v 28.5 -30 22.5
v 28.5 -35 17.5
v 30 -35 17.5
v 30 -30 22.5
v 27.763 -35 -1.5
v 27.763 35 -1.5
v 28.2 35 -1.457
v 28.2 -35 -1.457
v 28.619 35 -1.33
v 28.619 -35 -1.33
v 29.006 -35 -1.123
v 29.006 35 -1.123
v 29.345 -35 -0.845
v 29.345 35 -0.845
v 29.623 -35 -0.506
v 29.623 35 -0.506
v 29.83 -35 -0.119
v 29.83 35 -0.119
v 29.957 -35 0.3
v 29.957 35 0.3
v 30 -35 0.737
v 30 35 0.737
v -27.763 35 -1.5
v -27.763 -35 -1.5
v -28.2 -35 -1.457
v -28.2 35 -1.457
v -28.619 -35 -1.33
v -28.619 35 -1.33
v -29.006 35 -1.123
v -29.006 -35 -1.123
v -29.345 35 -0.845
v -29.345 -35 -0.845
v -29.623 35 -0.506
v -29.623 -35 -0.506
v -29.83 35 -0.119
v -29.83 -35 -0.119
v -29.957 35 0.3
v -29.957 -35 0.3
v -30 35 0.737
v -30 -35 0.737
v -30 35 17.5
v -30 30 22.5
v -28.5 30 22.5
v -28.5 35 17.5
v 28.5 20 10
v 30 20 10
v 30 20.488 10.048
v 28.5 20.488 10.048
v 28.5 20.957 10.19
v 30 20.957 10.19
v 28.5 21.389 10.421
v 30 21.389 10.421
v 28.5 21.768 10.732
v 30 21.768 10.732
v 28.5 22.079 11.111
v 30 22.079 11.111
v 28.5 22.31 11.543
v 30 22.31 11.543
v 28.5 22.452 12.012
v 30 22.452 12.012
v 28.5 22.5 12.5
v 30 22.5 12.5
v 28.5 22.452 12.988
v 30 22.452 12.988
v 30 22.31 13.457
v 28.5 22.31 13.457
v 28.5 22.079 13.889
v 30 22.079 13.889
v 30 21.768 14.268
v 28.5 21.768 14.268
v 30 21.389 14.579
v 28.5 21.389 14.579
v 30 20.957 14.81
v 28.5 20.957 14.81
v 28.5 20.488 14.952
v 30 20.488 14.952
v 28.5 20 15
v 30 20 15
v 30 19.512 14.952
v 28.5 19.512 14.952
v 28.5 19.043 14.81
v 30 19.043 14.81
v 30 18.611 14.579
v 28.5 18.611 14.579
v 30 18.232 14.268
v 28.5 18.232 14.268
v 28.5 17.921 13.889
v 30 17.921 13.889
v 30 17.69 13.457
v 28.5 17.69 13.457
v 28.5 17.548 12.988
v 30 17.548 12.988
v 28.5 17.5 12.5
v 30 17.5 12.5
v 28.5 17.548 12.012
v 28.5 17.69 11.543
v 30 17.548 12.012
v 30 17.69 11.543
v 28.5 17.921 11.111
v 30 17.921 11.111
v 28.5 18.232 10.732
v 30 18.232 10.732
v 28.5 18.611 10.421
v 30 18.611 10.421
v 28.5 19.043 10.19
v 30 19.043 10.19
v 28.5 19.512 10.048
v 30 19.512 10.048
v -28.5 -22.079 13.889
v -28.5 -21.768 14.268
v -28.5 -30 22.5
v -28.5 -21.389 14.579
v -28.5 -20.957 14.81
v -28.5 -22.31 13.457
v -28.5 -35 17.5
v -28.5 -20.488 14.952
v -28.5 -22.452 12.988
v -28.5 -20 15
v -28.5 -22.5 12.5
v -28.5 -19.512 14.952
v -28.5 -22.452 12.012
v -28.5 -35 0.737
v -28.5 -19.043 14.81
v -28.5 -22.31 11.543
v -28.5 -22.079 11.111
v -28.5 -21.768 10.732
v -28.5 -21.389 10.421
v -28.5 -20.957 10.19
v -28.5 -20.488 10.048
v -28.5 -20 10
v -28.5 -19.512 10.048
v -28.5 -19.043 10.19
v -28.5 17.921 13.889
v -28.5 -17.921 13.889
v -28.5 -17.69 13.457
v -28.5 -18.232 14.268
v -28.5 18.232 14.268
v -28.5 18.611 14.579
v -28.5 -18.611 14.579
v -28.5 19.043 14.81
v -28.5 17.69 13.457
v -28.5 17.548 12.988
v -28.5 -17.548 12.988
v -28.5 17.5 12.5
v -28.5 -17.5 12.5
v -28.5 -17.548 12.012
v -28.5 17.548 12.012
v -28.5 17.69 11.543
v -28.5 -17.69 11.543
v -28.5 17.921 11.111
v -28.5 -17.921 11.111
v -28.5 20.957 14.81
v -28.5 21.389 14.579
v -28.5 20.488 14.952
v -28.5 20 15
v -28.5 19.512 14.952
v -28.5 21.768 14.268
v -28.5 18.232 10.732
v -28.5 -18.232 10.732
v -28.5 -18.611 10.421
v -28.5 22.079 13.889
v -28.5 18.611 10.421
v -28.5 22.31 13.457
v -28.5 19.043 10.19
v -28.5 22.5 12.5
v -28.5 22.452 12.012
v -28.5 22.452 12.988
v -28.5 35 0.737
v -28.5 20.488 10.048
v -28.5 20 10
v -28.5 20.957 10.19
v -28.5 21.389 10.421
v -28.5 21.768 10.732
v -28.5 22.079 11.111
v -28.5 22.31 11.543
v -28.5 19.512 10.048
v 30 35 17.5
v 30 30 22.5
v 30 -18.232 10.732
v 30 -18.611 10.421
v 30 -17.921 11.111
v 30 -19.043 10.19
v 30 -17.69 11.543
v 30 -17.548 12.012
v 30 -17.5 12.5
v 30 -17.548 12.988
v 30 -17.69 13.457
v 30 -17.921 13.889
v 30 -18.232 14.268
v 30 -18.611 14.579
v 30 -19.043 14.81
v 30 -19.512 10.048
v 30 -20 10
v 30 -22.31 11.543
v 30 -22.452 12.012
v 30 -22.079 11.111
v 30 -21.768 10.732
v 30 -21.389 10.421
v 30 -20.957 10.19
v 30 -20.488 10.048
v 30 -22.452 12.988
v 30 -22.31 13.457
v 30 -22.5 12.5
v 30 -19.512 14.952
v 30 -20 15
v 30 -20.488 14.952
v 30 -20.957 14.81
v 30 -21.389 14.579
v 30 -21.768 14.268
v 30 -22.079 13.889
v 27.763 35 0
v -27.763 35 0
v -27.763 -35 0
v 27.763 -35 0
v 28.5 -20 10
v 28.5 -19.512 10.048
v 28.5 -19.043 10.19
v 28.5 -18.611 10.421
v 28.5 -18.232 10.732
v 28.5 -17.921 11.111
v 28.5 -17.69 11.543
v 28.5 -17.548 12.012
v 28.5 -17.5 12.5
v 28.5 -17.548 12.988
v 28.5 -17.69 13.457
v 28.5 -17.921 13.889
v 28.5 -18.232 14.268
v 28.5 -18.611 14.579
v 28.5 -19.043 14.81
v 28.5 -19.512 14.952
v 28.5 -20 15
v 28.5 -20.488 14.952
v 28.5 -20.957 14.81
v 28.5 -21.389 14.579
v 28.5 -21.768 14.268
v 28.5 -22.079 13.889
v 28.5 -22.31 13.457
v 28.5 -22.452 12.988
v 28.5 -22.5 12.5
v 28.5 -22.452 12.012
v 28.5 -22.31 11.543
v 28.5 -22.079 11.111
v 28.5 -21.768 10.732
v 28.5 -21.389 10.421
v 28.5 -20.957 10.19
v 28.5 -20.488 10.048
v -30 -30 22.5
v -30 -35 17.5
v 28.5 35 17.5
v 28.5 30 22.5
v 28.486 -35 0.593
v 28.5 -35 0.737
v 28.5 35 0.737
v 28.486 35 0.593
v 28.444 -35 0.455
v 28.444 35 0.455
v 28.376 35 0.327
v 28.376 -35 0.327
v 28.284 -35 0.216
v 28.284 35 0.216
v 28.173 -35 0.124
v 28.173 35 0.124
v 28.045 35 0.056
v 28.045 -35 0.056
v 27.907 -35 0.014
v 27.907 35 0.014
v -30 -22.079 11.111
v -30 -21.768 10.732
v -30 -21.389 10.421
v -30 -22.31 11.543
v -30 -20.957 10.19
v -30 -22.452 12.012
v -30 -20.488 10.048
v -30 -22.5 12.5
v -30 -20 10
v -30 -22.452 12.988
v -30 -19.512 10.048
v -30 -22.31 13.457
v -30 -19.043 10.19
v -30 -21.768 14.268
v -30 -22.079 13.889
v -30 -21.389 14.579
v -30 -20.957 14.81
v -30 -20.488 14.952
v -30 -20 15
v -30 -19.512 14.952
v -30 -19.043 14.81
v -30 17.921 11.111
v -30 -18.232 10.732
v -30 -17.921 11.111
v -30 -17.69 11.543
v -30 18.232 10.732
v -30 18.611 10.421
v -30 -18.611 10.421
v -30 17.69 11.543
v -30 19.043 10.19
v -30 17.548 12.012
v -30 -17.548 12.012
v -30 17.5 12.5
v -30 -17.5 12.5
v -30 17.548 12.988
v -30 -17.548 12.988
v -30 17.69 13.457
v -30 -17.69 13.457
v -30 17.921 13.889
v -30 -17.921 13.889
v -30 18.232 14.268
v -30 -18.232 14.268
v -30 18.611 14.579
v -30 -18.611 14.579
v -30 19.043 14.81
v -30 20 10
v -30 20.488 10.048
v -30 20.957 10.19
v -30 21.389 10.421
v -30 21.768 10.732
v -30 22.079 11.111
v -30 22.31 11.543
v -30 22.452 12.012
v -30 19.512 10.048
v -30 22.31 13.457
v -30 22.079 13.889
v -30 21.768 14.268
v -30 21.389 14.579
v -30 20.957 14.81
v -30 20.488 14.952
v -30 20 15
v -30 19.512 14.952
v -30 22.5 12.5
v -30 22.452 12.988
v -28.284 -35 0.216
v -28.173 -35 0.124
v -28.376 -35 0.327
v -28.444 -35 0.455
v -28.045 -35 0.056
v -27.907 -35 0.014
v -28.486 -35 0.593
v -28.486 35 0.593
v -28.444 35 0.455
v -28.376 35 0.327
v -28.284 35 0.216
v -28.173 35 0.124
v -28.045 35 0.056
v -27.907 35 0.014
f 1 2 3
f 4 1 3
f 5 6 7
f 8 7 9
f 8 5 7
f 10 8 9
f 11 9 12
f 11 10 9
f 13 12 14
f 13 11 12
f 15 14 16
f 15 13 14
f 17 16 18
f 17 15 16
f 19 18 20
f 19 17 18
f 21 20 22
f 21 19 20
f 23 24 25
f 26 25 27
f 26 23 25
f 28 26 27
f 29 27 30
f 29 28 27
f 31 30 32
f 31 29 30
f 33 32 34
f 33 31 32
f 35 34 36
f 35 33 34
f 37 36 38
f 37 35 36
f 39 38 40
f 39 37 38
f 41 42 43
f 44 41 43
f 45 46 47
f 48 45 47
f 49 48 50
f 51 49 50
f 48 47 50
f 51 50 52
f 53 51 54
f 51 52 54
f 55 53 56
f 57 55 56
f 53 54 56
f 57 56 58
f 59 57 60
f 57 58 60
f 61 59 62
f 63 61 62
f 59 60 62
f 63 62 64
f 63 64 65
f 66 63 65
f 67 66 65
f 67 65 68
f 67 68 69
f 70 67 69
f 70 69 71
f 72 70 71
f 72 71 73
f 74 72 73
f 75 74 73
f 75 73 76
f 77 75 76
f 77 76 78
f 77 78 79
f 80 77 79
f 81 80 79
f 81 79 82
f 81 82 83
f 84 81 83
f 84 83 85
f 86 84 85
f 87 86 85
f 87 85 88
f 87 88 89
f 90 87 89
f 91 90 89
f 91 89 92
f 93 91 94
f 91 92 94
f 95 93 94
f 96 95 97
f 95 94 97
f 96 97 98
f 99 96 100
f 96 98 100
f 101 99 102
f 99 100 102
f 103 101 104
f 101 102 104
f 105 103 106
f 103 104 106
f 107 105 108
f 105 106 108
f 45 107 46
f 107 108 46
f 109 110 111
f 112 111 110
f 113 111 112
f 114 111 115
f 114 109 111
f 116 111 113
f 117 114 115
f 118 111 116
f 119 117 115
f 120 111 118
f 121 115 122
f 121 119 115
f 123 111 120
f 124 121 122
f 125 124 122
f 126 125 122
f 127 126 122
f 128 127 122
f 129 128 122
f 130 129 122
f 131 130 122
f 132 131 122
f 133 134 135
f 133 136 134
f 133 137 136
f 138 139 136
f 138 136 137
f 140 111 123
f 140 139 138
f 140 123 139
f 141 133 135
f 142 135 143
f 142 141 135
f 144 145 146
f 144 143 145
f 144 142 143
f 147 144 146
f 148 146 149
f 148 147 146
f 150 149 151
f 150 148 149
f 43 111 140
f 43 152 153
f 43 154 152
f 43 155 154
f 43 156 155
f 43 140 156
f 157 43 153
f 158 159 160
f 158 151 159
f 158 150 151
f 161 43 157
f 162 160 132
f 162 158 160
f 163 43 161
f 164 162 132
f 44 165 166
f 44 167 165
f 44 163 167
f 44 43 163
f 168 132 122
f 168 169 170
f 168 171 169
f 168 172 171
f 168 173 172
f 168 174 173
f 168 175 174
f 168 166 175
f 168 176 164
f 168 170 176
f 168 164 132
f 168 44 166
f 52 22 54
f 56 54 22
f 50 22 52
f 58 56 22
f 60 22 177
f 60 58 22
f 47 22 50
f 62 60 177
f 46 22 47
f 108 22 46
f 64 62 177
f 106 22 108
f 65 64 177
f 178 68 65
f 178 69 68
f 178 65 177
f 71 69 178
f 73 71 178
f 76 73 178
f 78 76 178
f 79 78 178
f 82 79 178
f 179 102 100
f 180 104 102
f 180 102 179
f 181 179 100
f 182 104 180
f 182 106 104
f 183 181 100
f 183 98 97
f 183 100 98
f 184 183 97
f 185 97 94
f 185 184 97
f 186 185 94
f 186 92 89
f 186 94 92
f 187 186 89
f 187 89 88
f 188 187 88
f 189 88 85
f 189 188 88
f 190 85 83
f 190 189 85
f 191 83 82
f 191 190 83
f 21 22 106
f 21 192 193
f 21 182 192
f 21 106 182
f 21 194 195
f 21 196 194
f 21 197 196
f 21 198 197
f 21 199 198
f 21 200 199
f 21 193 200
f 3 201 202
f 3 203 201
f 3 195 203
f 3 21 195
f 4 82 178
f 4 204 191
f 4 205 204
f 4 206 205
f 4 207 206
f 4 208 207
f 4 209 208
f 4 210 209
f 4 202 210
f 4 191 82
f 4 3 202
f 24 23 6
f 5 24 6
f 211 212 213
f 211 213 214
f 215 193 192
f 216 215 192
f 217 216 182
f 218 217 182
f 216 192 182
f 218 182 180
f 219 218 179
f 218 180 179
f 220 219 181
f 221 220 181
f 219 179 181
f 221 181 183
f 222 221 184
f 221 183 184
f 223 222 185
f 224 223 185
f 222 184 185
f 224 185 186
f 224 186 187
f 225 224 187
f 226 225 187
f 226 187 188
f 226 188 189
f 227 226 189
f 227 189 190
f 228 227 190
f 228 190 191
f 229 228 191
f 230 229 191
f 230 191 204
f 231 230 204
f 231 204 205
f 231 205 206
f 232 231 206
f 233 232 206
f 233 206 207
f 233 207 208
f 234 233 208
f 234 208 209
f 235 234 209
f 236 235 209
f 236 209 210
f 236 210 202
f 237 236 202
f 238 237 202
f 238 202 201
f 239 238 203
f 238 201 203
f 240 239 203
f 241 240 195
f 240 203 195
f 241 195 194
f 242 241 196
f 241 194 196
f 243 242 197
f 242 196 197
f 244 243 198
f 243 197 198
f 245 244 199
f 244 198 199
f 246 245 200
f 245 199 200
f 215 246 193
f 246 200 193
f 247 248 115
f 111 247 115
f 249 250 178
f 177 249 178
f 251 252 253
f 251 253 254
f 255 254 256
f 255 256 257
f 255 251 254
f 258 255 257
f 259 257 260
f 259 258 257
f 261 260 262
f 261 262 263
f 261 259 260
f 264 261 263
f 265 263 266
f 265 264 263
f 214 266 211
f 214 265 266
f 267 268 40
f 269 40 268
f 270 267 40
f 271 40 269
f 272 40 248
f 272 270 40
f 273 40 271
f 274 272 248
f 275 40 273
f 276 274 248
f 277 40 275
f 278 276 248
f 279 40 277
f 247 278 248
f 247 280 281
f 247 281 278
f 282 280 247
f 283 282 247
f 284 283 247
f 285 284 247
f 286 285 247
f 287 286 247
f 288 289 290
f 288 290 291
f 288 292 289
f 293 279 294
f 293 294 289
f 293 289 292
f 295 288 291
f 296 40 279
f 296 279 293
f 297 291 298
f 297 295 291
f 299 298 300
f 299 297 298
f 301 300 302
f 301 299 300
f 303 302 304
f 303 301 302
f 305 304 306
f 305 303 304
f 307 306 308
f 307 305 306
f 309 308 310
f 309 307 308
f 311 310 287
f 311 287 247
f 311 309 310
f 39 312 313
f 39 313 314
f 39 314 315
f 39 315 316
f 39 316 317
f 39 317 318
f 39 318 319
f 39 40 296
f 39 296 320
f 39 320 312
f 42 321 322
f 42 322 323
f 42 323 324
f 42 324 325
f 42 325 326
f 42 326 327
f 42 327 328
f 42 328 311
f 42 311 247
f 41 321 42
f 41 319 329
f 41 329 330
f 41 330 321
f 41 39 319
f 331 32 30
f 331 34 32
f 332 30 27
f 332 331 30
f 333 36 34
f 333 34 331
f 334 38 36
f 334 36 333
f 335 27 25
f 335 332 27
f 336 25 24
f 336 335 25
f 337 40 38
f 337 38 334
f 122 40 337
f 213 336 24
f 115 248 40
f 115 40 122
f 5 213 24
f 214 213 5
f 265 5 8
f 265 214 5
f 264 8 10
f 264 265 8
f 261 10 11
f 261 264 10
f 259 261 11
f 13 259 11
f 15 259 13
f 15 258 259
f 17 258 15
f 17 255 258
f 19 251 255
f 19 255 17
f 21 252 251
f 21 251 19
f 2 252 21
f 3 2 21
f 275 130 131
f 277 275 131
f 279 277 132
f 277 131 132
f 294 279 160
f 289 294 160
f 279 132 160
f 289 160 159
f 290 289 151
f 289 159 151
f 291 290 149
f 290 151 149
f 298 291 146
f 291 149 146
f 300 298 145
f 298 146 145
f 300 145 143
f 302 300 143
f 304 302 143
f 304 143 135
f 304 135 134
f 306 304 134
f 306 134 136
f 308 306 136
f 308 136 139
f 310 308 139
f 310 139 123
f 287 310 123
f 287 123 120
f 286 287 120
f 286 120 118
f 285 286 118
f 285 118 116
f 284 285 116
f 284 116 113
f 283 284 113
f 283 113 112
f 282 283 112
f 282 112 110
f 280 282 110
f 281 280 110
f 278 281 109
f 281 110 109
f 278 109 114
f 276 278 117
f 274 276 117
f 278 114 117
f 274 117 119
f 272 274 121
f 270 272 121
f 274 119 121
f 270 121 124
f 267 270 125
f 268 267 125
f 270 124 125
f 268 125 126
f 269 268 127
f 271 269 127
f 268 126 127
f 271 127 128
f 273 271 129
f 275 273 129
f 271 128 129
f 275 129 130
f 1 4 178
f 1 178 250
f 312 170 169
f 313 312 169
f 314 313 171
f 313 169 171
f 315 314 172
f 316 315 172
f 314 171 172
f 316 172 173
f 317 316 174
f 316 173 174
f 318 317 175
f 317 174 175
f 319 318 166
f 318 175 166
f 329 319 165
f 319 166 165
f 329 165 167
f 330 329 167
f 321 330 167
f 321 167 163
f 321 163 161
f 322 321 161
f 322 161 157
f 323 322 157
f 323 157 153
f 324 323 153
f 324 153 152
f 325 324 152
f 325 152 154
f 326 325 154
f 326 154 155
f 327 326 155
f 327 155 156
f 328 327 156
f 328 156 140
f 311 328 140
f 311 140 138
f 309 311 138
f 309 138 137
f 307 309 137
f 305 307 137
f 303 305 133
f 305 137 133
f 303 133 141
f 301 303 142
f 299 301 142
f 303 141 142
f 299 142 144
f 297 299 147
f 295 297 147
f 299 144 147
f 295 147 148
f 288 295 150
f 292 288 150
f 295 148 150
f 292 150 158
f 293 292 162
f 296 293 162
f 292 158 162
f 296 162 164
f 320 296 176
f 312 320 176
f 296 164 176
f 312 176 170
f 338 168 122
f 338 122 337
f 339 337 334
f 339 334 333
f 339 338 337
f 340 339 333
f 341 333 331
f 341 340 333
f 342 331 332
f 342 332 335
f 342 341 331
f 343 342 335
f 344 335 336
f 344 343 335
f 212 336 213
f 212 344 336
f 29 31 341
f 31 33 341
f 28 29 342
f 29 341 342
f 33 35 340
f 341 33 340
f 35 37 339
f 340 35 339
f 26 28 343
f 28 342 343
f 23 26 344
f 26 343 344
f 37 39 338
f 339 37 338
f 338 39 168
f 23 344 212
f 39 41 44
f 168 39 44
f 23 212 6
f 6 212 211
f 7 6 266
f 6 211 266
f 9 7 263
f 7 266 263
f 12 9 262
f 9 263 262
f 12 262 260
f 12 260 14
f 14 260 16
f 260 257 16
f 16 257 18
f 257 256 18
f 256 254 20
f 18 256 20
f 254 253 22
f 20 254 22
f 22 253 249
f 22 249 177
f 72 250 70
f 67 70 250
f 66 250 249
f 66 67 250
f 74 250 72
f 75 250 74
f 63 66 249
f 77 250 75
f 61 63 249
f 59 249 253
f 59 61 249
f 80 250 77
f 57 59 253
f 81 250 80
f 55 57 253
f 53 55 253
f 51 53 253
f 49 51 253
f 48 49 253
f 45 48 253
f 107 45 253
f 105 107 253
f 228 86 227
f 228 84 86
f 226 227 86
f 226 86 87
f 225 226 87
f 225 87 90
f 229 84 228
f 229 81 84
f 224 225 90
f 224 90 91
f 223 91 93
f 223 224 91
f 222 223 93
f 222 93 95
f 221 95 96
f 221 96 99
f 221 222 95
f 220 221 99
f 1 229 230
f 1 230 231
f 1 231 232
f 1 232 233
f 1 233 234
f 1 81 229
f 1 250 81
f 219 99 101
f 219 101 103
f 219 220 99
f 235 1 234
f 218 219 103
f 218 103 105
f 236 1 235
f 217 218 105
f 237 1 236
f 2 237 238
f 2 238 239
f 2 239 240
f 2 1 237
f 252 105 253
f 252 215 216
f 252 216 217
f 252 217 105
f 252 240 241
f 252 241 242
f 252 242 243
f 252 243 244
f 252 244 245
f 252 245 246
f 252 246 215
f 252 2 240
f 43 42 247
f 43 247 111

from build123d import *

# Parameters (mm, degrees)
CROQUIS1_W                         = 60
CROQUIS1_H                         = 70
BRIDA_BASE1_DEPTH                  = 1.5
BRIDA_DE_ARISTA1_STRIP_W           = 7.4732
BRIDA_DE_ARISTA1_STRIP_H           = 1.5
BRIDA_DE_ARISTA1_STRIP_CUT_DEPTH   = 70
BRIDA_DE_ARISTA1_STRIP_2_W         = 7.4732
BRIDA_DE_ARISTA1_STRIP_2_H         = 1.5
BRIDA_DE_ARISTA1_STRIP_CUT_2_DEPTH = 70
BRIDA_DE_ARISTA1_DEPTH             = 70
BRIDA_DE_ARISTA1_BEND_DEPTH        = 70
ROMPER_START                       = -40.658639918
ROMPER_ESQUINA1_OUTLINE_W          = 64
ROMPER_ESQUINA1_OUTLINE_H          = 51.123106012
ROMPER_ESQUINA1_DEPTH              = 3.535533906
ROMPER_START_2                     = 5.303300859
ROMPER_ESQUINA1_2_OUTLINE_W        = 64
ROMPER_ESQUINA1_2_OUTLINE_H        = 3.876893988
ROMPER_ESQUINA1_2_DEPTH            = 7.071067812
CROQUIS16_R                        = 2.5
CORTAR_EXTRUIR1_DEPTH              = 74.015409333


# Read off the part's stored shape, not the designer's step: Romper esquina1
# Sheet-metal steps are written as plain solids
with BuildPart() as part:
    # Croquis1 → Brida base1 (new body)
    with BuildSketch(Plane.XY):
        Rectangle(CROQUIS1_W, CROQUIS1_H)
    extrude(amount=-BRIDA_BASE1_DEPTH)

    # Brida de arista1 strip (across the edge) → Brida de arista1 strip cut (cut)
    with BuildSketch(Plane(origin=(-30, 35, 0), x_dir=(1, 0, 0), z_dir=(0, -1, 0))):
        with Locations((-1.5, -0.75)):
            Rectangle(BRIDA_DE_ARISTA1_STRIP_W, BRIDA_DE_ARISTA1_STRIP_H)
    extrude(amount=BRIDA_DE_ARISTA1_STRIP_CUT_DEPTH, mode=Mode.SUBTRACT)

    # Brida de arista1 strip 2 (across the edge) → Brida de arista1 strip cut 2 (cut)
    with BuildSketch(Plane(origin=(30, -35, 0), x_dir=(-1, 0, 0), z_dir=(0, 1, 0))):
        with Locations((-1.5, -0.75)):
            Rectangle(BRIDA_DE_ARISTA1_STRIP_2_W, BRIDA_DE_ARISTA1_STRIP_2_H)
    extrude(amount=BRIDA_DE_ARISTA1_STRIP_CUT_2_DEPTH, mode=Mode.SUBTRACT)

    # Brida de arista1 section (across the edge) → Brida de arista1 (add)
    with BuildSketch(Plane(origin=(-30, 35, 0), x_dir=(1, 0, 0), z_dir=(0, -1, 0))):
        with BuildLine():
            Line((0, 0.7366), (0, 22.5))
            Line((0, 22.5), (1.5, 22.5))
            Line((1.5, 22.5), (1.5, 0.7366))
            ThreePointArc((1.5, 0.7366), (1.715745145, 0.215745145), (2.2366, 0))
            Line((2.2366, 0), (2.2366, -1.5))
            ThreePointArc((2.2366, -1.5), (0.655084973, -0.844915027), (0, 0.7366))
        make_face()
    extrude(amount=BRIDA_DE_ARISTA1_DEPTH)

    # Brida de arista1 section 2 (across the edge) → Brida de arista1 bend (add)
    with BuildSketch(Plane(origin=(30, -35, 0), x_dir=(-1, 0, 0), z_dir=(0, 1, 0))):
        with BuildLine():
            Line((0, 0.7366), (0, 22.5))
            Line((0, 22.5), (1.5, 22.5))
            Line((1.5, 22.5), (1.5, 0.7366))
            ThreePointArc((1.5, 0.7366), (1.715745145, 0.215745145), (2.2366, 0))
            Line((2.2366, 0), (2.2366, -1.5))
            ThreePointArc((2.2366, -1.5), (0.655084973, -0.844915027), (0, 0.7366))
        make_face()
    extrude(amount=BRIDA_DE_ARISTA1_BEND_DEPTH)

    # Romper esquina1 outline → Romper esquina1 (cut)
    with BuildSketch(Plane(origin=(0, 0, 0), x_dir=(1, 0, 0), z_dir=(0, 0.707106781186548, -0.707106781186547)).offset(ROMPER_START)):
        with Locations((0, -11.561553006)):
            Rectangle(ROMPER_ESQUINA1_OUTLINE_W, ROMPER_ESQUINA1_OUTLINE_H)
    extrude(amount=ROMPER_ESQUINA1_DEPTH, mode=Mode.SUBTRACT)

    # Romper esquina1 2 outline → Romper esquina1 2 (cut)
    with BuildSketch(Plane(origin=(0, 0, 0), x_dir=(1, 0, 0), z_dir=(0, 0.707106781186548, -0.707106781186547)).offset(ROMPER_START_2)):
        with Locations((0, -39.061553006)):
            Rectangle(ROMPER_ESQUINA1_2_OUTLINE_W, ROMPER_ESQUINA1_2_OUTLINE_H)
    extrude(amount=ROMPER_ESQUINA1_2_DEPTH, mode=Mode.SUBTRACT)

    # Croquis16 → Cortar-Extruir1 (cut, through all)
    with BuildSketch(Plane(origin=(30, 0, 0), x_dir=(0, 0, -1), z_dir=(1, 0, 0))):
        with Locations((-12.5, -20)):
            Circle(CROQUIS16_R)
        with Locations((-12.5, 20)):
            Circle(CROQUIS16_R)
    extrude(amount=-CORTAR_EXTRUIR1_DEPTH, mode=Mode.SUBTRACT)


solid = part.part
